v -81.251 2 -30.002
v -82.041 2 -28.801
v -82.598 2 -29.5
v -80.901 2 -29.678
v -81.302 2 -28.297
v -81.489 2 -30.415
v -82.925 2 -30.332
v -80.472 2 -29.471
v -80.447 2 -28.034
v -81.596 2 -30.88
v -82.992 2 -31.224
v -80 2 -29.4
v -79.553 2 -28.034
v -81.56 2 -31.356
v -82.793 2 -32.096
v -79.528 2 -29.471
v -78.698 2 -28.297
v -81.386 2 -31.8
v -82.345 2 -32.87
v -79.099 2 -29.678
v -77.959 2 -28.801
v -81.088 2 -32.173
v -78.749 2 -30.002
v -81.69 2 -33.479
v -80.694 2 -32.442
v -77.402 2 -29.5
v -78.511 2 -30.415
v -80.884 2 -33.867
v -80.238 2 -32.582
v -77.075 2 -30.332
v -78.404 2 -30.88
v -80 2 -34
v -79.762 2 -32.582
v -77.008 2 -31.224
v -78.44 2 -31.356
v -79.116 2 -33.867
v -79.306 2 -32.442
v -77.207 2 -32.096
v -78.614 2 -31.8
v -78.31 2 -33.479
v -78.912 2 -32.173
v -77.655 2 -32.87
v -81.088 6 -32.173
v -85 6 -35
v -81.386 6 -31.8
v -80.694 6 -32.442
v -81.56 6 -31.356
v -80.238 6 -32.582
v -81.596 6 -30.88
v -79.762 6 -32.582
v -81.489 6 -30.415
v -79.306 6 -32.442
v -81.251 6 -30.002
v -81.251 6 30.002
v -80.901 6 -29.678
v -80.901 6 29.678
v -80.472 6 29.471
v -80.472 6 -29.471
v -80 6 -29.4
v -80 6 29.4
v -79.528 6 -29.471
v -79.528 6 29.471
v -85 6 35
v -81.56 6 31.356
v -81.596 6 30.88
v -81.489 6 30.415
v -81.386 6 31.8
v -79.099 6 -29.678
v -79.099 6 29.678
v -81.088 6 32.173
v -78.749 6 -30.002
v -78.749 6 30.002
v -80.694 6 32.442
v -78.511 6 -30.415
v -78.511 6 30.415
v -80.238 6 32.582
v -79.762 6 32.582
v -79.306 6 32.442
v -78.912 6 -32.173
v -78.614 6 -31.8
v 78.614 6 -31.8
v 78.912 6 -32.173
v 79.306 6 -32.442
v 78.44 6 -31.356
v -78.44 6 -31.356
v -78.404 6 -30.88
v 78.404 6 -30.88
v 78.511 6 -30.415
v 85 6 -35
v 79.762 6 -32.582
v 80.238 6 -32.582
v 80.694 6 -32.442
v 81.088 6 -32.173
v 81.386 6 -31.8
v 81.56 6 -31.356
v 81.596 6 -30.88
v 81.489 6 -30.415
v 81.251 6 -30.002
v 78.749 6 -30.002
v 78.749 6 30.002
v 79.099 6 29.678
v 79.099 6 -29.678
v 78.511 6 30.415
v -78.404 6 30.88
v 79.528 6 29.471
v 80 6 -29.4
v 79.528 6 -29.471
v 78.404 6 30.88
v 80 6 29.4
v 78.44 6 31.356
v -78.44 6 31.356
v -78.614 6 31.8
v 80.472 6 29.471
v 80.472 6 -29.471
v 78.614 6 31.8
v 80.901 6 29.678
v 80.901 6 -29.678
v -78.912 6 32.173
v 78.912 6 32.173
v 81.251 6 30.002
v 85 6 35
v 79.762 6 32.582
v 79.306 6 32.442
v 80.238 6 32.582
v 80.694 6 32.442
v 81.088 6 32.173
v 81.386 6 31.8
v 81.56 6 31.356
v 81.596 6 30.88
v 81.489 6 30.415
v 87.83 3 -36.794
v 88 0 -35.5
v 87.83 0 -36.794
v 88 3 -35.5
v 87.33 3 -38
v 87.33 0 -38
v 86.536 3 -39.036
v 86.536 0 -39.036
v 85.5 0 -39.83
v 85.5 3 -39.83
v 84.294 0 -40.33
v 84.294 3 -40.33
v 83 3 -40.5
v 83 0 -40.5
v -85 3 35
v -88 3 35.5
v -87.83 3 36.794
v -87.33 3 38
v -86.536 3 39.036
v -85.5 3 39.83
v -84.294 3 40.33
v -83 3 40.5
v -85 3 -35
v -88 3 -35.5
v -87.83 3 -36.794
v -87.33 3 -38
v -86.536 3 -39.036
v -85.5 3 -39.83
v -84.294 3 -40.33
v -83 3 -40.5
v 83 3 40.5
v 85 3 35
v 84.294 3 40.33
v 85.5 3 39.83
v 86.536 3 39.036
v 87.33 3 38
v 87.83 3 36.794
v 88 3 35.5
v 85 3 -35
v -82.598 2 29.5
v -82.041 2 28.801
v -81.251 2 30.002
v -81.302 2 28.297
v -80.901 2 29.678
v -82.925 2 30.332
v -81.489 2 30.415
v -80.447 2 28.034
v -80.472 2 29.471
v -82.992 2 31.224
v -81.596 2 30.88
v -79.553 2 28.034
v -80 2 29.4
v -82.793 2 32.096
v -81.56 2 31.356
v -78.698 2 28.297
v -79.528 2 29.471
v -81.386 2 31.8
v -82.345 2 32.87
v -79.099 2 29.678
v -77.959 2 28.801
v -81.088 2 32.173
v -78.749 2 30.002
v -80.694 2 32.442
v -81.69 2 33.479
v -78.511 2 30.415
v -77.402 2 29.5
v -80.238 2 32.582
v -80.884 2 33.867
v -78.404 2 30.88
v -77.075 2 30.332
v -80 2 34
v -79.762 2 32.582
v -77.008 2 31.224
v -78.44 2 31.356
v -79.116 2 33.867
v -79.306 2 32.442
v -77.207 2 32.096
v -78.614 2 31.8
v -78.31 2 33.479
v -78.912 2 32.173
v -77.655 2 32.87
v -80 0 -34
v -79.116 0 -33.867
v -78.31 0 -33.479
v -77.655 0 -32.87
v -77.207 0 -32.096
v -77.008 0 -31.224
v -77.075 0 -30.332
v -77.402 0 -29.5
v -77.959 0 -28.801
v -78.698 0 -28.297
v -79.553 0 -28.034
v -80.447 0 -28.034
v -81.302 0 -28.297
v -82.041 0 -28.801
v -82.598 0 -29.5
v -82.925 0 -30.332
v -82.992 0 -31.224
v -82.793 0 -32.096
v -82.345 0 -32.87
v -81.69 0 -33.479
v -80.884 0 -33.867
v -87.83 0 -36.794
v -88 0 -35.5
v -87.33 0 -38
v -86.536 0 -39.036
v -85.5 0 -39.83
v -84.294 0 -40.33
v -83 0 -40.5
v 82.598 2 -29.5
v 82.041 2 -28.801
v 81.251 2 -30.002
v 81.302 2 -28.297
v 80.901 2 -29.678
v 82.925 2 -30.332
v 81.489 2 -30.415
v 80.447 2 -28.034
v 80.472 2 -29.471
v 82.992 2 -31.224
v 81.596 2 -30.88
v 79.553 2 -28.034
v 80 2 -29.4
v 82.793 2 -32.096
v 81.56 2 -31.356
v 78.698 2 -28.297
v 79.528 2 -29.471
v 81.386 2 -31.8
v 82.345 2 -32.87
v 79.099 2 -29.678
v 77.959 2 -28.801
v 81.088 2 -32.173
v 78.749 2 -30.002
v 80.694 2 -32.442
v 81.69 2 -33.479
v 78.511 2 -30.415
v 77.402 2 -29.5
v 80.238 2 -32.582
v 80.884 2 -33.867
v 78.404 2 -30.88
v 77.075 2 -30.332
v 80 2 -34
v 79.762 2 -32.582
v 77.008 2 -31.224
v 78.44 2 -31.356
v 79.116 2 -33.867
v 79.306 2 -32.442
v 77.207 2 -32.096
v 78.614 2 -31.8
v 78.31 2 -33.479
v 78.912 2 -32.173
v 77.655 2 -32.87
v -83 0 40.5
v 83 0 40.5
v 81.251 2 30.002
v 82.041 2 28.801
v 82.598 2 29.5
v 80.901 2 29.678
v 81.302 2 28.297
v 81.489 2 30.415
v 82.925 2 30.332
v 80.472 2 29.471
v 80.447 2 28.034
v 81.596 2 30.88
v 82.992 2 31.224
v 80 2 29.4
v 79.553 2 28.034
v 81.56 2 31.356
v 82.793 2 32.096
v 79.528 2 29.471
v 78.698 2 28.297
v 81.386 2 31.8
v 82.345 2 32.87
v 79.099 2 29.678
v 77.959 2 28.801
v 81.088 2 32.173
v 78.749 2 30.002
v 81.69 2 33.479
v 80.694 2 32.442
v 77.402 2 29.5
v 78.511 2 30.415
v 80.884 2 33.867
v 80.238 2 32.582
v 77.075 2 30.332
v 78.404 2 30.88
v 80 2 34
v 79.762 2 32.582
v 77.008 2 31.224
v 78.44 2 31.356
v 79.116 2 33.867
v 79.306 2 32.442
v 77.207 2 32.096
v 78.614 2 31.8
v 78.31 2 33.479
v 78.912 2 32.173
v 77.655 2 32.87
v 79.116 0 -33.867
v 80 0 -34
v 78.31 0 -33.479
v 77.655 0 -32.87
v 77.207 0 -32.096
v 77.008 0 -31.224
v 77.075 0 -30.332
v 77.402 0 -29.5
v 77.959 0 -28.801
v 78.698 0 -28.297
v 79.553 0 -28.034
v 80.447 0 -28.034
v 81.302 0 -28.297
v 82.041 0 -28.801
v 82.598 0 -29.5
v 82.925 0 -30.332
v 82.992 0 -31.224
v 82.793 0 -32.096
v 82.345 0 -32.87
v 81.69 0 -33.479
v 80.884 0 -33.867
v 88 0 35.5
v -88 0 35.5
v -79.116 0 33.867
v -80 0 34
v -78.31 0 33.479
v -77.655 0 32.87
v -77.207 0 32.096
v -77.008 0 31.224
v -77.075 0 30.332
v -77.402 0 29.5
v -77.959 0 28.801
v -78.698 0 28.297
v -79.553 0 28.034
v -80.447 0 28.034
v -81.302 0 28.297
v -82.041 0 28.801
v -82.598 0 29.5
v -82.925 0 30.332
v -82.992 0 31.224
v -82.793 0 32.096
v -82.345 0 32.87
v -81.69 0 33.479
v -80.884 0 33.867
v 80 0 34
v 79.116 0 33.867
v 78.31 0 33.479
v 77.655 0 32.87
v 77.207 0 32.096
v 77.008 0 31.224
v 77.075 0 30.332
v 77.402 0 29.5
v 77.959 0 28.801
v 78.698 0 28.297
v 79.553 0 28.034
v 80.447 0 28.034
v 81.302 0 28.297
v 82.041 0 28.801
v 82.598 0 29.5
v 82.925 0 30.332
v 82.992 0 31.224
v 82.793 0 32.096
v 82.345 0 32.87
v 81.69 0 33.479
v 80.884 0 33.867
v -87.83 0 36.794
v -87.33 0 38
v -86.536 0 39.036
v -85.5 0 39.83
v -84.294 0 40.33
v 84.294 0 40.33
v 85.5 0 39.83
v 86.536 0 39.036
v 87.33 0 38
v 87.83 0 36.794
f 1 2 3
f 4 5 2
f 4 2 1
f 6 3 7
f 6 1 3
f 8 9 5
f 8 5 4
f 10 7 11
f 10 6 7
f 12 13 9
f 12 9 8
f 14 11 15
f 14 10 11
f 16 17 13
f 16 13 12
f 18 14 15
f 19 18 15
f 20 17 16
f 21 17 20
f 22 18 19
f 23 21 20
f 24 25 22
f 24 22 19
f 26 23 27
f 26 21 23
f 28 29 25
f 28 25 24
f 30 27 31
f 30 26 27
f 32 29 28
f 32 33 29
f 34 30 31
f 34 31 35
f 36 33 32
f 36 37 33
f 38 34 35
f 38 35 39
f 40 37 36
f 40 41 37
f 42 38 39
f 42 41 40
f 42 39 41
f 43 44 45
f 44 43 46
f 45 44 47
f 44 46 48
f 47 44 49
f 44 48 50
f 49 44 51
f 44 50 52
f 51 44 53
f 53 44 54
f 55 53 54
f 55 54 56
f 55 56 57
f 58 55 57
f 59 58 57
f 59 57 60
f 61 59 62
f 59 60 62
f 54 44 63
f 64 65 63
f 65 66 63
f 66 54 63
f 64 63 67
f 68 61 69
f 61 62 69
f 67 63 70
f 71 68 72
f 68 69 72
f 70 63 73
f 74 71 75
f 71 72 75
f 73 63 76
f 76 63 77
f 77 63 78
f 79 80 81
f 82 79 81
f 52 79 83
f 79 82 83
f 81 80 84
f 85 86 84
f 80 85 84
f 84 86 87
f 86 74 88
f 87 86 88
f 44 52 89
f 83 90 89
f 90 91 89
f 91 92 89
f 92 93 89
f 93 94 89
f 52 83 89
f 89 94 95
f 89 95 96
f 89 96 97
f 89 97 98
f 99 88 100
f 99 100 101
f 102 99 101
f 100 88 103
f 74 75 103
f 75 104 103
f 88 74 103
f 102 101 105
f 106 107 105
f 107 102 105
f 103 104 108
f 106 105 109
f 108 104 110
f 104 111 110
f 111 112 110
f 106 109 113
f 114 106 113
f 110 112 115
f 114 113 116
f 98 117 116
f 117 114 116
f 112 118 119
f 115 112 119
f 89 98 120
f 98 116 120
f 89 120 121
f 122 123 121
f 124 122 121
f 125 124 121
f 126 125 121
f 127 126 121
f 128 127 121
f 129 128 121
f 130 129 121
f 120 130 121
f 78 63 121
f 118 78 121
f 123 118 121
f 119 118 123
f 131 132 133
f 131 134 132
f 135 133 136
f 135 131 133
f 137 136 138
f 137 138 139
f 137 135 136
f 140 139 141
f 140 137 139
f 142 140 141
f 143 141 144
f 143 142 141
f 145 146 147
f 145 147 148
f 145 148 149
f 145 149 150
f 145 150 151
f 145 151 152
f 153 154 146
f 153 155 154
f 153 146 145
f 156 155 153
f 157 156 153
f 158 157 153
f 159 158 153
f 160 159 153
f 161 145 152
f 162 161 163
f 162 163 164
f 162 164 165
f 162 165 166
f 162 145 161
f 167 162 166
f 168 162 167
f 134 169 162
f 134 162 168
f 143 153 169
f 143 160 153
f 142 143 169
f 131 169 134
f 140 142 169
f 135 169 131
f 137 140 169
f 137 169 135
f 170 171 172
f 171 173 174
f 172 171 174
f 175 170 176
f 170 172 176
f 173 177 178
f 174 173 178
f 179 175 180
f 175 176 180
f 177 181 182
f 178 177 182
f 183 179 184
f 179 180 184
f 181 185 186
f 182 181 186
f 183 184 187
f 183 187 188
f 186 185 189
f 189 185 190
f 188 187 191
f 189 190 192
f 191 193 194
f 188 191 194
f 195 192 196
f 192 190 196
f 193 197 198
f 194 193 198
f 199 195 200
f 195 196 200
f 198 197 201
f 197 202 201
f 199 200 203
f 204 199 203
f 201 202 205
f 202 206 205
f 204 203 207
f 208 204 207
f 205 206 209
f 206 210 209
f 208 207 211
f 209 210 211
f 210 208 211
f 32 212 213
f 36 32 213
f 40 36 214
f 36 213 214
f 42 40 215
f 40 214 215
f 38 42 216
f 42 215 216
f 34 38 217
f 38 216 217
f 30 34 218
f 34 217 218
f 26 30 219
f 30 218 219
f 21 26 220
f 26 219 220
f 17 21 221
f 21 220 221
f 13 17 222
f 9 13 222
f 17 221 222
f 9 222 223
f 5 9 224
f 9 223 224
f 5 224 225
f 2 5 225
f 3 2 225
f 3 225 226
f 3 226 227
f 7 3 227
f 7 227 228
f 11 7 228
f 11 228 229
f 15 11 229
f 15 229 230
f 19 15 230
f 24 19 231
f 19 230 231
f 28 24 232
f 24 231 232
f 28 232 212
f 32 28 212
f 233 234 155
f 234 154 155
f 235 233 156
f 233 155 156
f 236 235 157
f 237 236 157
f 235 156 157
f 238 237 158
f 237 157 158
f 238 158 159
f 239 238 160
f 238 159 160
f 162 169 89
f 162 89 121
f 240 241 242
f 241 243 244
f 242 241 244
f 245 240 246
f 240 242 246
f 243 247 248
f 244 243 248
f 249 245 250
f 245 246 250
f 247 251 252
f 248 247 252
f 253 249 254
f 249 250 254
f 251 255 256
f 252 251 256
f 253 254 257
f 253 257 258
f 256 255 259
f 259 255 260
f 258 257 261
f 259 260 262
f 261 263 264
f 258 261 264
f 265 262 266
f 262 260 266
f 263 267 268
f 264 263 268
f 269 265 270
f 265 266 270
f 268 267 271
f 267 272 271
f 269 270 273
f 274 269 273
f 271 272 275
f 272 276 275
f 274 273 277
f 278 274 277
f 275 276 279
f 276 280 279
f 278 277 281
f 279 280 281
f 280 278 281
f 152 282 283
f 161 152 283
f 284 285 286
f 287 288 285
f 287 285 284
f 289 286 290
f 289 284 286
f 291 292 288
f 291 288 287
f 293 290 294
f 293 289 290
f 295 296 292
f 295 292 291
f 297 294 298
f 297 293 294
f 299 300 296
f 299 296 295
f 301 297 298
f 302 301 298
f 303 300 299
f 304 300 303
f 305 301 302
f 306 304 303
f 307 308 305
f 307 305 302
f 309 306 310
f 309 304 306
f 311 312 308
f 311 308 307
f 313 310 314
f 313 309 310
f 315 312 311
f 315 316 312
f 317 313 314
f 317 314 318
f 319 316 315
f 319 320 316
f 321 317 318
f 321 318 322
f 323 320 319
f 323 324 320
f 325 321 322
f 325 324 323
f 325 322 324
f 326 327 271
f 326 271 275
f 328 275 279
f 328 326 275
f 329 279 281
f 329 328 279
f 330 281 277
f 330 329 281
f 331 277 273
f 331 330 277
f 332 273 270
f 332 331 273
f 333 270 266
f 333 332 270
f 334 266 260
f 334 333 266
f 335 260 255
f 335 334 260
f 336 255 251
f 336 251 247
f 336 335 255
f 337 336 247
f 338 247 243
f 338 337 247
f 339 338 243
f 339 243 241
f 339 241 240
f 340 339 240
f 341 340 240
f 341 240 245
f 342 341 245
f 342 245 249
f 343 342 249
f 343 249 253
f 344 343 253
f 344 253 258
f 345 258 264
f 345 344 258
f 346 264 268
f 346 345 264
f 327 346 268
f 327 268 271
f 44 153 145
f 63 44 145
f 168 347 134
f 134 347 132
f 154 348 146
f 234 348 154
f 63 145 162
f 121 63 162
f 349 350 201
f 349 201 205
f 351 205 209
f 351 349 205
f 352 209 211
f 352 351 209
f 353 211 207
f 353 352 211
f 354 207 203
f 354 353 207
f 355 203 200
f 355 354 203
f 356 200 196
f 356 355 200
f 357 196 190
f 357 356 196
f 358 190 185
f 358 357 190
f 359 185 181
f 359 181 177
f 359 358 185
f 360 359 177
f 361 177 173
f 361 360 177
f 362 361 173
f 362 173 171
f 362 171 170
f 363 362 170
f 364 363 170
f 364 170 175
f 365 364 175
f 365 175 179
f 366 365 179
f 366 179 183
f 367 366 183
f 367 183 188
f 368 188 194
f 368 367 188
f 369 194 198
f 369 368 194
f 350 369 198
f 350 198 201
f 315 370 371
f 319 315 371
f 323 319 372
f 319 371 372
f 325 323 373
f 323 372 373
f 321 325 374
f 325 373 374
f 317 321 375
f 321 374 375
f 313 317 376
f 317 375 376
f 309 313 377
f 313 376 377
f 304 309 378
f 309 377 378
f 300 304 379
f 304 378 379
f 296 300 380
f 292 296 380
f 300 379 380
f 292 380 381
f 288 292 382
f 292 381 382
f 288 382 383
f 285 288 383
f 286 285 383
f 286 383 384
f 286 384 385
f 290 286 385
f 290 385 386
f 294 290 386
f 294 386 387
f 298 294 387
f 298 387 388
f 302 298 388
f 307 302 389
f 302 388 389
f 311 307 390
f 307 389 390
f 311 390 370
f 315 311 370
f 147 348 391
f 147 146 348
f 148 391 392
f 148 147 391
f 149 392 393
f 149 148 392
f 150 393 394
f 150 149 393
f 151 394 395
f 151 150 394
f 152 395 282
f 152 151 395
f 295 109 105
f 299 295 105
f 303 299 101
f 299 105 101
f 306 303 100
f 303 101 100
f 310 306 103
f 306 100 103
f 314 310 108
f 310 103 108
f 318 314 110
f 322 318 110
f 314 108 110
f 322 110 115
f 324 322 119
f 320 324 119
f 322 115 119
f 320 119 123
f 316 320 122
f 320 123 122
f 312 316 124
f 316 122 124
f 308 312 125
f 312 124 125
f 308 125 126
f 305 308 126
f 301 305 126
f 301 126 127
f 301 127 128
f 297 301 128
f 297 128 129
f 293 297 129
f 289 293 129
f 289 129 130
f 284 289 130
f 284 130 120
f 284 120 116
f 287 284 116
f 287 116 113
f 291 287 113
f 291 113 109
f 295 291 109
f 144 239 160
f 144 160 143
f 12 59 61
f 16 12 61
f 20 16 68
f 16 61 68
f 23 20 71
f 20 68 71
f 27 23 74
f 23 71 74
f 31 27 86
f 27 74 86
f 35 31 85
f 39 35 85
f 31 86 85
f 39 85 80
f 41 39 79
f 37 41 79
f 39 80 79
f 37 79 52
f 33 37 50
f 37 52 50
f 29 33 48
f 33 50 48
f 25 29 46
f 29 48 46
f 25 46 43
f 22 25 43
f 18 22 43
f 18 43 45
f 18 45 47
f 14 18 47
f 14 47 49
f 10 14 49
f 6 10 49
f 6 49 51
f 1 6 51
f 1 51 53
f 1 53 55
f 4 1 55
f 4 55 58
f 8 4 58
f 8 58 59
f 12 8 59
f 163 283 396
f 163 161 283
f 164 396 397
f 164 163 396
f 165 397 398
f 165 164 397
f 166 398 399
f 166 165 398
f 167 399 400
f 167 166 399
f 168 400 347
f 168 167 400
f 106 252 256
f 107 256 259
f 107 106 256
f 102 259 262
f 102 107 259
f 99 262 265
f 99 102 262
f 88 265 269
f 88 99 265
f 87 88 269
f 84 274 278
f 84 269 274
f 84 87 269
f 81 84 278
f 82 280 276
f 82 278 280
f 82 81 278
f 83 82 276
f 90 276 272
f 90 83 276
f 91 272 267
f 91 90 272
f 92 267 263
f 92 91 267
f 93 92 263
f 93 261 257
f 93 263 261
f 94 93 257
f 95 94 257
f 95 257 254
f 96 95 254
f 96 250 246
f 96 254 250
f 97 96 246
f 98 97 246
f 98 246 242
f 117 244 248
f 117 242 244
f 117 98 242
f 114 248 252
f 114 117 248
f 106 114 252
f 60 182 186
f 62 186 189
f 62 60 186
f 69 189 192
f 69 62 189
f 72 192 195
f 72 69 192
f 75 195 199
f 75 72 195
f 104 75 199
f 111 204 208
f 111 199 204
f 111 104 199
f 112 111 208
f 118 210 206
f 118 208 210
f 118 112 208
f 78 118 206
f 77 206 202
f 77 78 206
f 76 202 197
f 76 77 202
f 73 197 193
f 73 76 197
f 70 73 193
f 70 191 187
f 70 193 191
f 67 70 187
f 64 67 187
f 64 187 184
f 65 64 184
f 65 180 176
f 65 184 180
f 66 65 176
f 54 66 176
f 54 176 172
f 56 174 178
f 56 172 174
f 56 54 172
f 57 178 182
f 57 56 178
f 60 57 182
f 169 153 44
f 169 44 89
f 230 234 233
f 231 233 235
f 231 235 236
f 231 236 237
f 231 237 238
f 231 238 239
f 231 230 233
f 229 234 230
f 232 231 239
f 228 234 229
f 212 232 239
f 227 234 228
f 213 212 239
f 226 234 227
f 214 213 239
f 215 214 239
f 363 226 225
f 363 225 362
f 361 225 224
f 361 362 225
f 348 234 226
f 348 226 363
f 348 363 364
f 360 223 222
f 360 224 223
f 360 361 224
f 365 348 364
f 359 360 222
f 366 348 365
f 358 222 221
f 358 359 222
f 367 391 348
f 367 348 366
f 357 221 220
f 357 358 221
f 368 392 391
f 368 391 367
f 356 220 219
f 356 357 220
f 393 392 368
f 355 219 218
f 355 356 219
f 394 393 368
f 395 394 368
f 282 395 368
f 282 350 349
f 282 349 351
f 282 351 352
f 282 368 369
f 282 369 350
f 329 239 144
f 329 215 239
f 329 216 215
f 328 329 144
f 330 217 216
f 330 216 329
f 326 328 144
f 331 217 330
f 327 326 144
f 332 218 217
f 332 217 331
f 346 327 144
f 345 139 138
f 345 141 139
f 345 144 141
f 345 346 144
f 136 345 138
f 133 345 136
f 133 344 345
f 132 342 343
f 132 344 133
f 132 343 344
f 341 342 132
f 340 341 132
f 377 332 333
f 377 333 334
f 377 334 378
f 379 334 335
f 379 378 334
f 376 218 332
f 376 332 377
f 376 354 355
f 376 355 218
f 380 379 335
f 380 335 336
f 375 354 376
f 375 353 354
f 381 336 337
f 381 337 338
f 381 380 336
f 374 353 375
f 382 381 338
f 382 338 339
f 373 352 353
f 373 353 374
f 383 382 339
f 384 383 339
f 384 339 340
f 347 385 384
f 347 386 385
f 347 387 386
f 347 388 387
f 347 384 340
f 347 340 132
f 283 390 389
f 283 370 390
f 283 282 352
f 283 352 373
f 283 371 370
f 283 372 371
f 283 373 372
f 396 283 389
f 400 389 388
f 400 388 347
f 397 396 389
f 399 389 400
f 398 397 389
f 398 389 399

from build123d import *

# Parameters (mm, degrees)
SKETCH1_W               = 176
SKETCH1_H               = 81
BOSS_EXTRUDE1_DEPTH     = 3
FILLET1_R               = 5
SKETCH2_W               = 170
SKETCH2_H               = 70
BOSS_EXTRUDE2_DEPTH     = 6
SKETCH3_R               = 1.6
CUT_EXTRUDE1_DEPTH      = 98.057972367
SKETCH5_R               = 3
CUT_EXTRUDE5_DEPTH      = 2
MIRROR2_COPY_1_SKETCH_R = 1.6
MIRROR2_COPY_1_DEPTH    = 98.057972367
MIRROR2_COPY_2_SKETCH_R = 3
MIRROR2_COPY_2_DEPTH    = 2


with BuildPart() as part:
    # Sketch1 → Boss-Extrude1 (new body)
    with BuildSketch(Plane(origin=(0, 0, 0), x_dir=(1, 0, 0), z_dir=(0, 1, 0))):
        Rectangle(SKETCH1_W, SKETCH1_H)
    extrude(amount=BOSS_EXTRUDE1_DEPTH)

    # Fillet1
    fillet1_edges = [part.edges().sort_by_distance(p)[0] for p in [
        (-88, 1.5, -40.5),
        (-88, 1.5, 40.5),
        (88, 1.5, 40.5),
        (88, 1.5, -40.5),
    ]]
    fillet(fillet1_edges, radius=FILLET1_R)

    # Sketch2 → Boss-Extrude2 (add)
    with BuildSketch(Plane.XZ):
        Rectangle(SKETCH2_W, SKETCH2_H)
    extrude(amount=-BOSS_EXTRUDE2_DEPTH)

    # Sketch3 → Cut-Extrude1 (cut, through all)
    with BuildSketch(Plane(origin=(0, 6, 0), x_dir=(1, 0, 0), z_dir=(0, 1, 0))):
        with Locations(Location((-80, 31, 0), (0, 0, 270))):
            Circle(SKETCH3_R)
    cut_extrude1 = extrude(amount=-CUT_EXTRUDE1_DEPTH, mode=Mode.SUBTRACT)

    # Sketch5 → Cut-Extrude5 (cut)
    with BuildSketch(Plane.XZ):
        with Locations(Location((-80, -31, 0), (0, 0, 270))):
            Circle(SKETCH5_R)
    cut_extrude5 = extrude(amount=-CUT_EXTRUDE5_DEPTH, mode=Mode.SUBTRACT)

    # Mirror1: Cut-Extrude1, Cut-Extrude5 across plane
    add(cut_extrude1.mirror(Plane.XY), mode=Mode.SUBTRACT)
    add(cut_extrude5.mirror(Plane.XY), mode=Mode.SUBTRACT)

    # Mirror2: Cut-Extrude1, Cut-Extrude5 across plane
    add(cut_extrude1.mirror(Plane(origin=(0, 0, 0), x_dir=(0, 0, 1), z_dir=(1, 0, 0))), mode=Mode.SUBTRACT)
    add(cut_extrude5.mirror(Plane(origin=(0, 0, 0), x_dir=(0, 0, 1), z_dir=(1, 0, 0))), mode=Mode.SUBTRACT)

    # Mirror2 copy 1 sketch → Mirror2 copy 1 (cut, through all)
    with BuildSketch(Plane(origin=(0, 6, 0), x_dir=(-1, 0, 0), z_dir=(0, 1, 0))):
        with Locations(Location((-80, 31, 0), (0, 0, 270))):
            Circle(MIRROR2_COPY_1_SKETCH_R)
    extrude(amount=-MIRROR2_COPY_1_DEPTH, mode=Mode.SUBTRACT)

    # Mirror2 copy 2 sketch → Mirror2 copy 2 (cut)
    with BuildSketch(Plane(origin=(0, 0, 0), x_dir=(-1, 0, 0), z_dir=(0, -1, 0))):
        with Locations(Location((-80, -31, 0), (0, 0, 270))):
            Circle(MIRROR2_COPY_2_SKETCH_R)
    extrude(amount=-MIRROR2_COPY_2_DEPTH, mode=Mode.SUBTRACT)


solid = part.part
